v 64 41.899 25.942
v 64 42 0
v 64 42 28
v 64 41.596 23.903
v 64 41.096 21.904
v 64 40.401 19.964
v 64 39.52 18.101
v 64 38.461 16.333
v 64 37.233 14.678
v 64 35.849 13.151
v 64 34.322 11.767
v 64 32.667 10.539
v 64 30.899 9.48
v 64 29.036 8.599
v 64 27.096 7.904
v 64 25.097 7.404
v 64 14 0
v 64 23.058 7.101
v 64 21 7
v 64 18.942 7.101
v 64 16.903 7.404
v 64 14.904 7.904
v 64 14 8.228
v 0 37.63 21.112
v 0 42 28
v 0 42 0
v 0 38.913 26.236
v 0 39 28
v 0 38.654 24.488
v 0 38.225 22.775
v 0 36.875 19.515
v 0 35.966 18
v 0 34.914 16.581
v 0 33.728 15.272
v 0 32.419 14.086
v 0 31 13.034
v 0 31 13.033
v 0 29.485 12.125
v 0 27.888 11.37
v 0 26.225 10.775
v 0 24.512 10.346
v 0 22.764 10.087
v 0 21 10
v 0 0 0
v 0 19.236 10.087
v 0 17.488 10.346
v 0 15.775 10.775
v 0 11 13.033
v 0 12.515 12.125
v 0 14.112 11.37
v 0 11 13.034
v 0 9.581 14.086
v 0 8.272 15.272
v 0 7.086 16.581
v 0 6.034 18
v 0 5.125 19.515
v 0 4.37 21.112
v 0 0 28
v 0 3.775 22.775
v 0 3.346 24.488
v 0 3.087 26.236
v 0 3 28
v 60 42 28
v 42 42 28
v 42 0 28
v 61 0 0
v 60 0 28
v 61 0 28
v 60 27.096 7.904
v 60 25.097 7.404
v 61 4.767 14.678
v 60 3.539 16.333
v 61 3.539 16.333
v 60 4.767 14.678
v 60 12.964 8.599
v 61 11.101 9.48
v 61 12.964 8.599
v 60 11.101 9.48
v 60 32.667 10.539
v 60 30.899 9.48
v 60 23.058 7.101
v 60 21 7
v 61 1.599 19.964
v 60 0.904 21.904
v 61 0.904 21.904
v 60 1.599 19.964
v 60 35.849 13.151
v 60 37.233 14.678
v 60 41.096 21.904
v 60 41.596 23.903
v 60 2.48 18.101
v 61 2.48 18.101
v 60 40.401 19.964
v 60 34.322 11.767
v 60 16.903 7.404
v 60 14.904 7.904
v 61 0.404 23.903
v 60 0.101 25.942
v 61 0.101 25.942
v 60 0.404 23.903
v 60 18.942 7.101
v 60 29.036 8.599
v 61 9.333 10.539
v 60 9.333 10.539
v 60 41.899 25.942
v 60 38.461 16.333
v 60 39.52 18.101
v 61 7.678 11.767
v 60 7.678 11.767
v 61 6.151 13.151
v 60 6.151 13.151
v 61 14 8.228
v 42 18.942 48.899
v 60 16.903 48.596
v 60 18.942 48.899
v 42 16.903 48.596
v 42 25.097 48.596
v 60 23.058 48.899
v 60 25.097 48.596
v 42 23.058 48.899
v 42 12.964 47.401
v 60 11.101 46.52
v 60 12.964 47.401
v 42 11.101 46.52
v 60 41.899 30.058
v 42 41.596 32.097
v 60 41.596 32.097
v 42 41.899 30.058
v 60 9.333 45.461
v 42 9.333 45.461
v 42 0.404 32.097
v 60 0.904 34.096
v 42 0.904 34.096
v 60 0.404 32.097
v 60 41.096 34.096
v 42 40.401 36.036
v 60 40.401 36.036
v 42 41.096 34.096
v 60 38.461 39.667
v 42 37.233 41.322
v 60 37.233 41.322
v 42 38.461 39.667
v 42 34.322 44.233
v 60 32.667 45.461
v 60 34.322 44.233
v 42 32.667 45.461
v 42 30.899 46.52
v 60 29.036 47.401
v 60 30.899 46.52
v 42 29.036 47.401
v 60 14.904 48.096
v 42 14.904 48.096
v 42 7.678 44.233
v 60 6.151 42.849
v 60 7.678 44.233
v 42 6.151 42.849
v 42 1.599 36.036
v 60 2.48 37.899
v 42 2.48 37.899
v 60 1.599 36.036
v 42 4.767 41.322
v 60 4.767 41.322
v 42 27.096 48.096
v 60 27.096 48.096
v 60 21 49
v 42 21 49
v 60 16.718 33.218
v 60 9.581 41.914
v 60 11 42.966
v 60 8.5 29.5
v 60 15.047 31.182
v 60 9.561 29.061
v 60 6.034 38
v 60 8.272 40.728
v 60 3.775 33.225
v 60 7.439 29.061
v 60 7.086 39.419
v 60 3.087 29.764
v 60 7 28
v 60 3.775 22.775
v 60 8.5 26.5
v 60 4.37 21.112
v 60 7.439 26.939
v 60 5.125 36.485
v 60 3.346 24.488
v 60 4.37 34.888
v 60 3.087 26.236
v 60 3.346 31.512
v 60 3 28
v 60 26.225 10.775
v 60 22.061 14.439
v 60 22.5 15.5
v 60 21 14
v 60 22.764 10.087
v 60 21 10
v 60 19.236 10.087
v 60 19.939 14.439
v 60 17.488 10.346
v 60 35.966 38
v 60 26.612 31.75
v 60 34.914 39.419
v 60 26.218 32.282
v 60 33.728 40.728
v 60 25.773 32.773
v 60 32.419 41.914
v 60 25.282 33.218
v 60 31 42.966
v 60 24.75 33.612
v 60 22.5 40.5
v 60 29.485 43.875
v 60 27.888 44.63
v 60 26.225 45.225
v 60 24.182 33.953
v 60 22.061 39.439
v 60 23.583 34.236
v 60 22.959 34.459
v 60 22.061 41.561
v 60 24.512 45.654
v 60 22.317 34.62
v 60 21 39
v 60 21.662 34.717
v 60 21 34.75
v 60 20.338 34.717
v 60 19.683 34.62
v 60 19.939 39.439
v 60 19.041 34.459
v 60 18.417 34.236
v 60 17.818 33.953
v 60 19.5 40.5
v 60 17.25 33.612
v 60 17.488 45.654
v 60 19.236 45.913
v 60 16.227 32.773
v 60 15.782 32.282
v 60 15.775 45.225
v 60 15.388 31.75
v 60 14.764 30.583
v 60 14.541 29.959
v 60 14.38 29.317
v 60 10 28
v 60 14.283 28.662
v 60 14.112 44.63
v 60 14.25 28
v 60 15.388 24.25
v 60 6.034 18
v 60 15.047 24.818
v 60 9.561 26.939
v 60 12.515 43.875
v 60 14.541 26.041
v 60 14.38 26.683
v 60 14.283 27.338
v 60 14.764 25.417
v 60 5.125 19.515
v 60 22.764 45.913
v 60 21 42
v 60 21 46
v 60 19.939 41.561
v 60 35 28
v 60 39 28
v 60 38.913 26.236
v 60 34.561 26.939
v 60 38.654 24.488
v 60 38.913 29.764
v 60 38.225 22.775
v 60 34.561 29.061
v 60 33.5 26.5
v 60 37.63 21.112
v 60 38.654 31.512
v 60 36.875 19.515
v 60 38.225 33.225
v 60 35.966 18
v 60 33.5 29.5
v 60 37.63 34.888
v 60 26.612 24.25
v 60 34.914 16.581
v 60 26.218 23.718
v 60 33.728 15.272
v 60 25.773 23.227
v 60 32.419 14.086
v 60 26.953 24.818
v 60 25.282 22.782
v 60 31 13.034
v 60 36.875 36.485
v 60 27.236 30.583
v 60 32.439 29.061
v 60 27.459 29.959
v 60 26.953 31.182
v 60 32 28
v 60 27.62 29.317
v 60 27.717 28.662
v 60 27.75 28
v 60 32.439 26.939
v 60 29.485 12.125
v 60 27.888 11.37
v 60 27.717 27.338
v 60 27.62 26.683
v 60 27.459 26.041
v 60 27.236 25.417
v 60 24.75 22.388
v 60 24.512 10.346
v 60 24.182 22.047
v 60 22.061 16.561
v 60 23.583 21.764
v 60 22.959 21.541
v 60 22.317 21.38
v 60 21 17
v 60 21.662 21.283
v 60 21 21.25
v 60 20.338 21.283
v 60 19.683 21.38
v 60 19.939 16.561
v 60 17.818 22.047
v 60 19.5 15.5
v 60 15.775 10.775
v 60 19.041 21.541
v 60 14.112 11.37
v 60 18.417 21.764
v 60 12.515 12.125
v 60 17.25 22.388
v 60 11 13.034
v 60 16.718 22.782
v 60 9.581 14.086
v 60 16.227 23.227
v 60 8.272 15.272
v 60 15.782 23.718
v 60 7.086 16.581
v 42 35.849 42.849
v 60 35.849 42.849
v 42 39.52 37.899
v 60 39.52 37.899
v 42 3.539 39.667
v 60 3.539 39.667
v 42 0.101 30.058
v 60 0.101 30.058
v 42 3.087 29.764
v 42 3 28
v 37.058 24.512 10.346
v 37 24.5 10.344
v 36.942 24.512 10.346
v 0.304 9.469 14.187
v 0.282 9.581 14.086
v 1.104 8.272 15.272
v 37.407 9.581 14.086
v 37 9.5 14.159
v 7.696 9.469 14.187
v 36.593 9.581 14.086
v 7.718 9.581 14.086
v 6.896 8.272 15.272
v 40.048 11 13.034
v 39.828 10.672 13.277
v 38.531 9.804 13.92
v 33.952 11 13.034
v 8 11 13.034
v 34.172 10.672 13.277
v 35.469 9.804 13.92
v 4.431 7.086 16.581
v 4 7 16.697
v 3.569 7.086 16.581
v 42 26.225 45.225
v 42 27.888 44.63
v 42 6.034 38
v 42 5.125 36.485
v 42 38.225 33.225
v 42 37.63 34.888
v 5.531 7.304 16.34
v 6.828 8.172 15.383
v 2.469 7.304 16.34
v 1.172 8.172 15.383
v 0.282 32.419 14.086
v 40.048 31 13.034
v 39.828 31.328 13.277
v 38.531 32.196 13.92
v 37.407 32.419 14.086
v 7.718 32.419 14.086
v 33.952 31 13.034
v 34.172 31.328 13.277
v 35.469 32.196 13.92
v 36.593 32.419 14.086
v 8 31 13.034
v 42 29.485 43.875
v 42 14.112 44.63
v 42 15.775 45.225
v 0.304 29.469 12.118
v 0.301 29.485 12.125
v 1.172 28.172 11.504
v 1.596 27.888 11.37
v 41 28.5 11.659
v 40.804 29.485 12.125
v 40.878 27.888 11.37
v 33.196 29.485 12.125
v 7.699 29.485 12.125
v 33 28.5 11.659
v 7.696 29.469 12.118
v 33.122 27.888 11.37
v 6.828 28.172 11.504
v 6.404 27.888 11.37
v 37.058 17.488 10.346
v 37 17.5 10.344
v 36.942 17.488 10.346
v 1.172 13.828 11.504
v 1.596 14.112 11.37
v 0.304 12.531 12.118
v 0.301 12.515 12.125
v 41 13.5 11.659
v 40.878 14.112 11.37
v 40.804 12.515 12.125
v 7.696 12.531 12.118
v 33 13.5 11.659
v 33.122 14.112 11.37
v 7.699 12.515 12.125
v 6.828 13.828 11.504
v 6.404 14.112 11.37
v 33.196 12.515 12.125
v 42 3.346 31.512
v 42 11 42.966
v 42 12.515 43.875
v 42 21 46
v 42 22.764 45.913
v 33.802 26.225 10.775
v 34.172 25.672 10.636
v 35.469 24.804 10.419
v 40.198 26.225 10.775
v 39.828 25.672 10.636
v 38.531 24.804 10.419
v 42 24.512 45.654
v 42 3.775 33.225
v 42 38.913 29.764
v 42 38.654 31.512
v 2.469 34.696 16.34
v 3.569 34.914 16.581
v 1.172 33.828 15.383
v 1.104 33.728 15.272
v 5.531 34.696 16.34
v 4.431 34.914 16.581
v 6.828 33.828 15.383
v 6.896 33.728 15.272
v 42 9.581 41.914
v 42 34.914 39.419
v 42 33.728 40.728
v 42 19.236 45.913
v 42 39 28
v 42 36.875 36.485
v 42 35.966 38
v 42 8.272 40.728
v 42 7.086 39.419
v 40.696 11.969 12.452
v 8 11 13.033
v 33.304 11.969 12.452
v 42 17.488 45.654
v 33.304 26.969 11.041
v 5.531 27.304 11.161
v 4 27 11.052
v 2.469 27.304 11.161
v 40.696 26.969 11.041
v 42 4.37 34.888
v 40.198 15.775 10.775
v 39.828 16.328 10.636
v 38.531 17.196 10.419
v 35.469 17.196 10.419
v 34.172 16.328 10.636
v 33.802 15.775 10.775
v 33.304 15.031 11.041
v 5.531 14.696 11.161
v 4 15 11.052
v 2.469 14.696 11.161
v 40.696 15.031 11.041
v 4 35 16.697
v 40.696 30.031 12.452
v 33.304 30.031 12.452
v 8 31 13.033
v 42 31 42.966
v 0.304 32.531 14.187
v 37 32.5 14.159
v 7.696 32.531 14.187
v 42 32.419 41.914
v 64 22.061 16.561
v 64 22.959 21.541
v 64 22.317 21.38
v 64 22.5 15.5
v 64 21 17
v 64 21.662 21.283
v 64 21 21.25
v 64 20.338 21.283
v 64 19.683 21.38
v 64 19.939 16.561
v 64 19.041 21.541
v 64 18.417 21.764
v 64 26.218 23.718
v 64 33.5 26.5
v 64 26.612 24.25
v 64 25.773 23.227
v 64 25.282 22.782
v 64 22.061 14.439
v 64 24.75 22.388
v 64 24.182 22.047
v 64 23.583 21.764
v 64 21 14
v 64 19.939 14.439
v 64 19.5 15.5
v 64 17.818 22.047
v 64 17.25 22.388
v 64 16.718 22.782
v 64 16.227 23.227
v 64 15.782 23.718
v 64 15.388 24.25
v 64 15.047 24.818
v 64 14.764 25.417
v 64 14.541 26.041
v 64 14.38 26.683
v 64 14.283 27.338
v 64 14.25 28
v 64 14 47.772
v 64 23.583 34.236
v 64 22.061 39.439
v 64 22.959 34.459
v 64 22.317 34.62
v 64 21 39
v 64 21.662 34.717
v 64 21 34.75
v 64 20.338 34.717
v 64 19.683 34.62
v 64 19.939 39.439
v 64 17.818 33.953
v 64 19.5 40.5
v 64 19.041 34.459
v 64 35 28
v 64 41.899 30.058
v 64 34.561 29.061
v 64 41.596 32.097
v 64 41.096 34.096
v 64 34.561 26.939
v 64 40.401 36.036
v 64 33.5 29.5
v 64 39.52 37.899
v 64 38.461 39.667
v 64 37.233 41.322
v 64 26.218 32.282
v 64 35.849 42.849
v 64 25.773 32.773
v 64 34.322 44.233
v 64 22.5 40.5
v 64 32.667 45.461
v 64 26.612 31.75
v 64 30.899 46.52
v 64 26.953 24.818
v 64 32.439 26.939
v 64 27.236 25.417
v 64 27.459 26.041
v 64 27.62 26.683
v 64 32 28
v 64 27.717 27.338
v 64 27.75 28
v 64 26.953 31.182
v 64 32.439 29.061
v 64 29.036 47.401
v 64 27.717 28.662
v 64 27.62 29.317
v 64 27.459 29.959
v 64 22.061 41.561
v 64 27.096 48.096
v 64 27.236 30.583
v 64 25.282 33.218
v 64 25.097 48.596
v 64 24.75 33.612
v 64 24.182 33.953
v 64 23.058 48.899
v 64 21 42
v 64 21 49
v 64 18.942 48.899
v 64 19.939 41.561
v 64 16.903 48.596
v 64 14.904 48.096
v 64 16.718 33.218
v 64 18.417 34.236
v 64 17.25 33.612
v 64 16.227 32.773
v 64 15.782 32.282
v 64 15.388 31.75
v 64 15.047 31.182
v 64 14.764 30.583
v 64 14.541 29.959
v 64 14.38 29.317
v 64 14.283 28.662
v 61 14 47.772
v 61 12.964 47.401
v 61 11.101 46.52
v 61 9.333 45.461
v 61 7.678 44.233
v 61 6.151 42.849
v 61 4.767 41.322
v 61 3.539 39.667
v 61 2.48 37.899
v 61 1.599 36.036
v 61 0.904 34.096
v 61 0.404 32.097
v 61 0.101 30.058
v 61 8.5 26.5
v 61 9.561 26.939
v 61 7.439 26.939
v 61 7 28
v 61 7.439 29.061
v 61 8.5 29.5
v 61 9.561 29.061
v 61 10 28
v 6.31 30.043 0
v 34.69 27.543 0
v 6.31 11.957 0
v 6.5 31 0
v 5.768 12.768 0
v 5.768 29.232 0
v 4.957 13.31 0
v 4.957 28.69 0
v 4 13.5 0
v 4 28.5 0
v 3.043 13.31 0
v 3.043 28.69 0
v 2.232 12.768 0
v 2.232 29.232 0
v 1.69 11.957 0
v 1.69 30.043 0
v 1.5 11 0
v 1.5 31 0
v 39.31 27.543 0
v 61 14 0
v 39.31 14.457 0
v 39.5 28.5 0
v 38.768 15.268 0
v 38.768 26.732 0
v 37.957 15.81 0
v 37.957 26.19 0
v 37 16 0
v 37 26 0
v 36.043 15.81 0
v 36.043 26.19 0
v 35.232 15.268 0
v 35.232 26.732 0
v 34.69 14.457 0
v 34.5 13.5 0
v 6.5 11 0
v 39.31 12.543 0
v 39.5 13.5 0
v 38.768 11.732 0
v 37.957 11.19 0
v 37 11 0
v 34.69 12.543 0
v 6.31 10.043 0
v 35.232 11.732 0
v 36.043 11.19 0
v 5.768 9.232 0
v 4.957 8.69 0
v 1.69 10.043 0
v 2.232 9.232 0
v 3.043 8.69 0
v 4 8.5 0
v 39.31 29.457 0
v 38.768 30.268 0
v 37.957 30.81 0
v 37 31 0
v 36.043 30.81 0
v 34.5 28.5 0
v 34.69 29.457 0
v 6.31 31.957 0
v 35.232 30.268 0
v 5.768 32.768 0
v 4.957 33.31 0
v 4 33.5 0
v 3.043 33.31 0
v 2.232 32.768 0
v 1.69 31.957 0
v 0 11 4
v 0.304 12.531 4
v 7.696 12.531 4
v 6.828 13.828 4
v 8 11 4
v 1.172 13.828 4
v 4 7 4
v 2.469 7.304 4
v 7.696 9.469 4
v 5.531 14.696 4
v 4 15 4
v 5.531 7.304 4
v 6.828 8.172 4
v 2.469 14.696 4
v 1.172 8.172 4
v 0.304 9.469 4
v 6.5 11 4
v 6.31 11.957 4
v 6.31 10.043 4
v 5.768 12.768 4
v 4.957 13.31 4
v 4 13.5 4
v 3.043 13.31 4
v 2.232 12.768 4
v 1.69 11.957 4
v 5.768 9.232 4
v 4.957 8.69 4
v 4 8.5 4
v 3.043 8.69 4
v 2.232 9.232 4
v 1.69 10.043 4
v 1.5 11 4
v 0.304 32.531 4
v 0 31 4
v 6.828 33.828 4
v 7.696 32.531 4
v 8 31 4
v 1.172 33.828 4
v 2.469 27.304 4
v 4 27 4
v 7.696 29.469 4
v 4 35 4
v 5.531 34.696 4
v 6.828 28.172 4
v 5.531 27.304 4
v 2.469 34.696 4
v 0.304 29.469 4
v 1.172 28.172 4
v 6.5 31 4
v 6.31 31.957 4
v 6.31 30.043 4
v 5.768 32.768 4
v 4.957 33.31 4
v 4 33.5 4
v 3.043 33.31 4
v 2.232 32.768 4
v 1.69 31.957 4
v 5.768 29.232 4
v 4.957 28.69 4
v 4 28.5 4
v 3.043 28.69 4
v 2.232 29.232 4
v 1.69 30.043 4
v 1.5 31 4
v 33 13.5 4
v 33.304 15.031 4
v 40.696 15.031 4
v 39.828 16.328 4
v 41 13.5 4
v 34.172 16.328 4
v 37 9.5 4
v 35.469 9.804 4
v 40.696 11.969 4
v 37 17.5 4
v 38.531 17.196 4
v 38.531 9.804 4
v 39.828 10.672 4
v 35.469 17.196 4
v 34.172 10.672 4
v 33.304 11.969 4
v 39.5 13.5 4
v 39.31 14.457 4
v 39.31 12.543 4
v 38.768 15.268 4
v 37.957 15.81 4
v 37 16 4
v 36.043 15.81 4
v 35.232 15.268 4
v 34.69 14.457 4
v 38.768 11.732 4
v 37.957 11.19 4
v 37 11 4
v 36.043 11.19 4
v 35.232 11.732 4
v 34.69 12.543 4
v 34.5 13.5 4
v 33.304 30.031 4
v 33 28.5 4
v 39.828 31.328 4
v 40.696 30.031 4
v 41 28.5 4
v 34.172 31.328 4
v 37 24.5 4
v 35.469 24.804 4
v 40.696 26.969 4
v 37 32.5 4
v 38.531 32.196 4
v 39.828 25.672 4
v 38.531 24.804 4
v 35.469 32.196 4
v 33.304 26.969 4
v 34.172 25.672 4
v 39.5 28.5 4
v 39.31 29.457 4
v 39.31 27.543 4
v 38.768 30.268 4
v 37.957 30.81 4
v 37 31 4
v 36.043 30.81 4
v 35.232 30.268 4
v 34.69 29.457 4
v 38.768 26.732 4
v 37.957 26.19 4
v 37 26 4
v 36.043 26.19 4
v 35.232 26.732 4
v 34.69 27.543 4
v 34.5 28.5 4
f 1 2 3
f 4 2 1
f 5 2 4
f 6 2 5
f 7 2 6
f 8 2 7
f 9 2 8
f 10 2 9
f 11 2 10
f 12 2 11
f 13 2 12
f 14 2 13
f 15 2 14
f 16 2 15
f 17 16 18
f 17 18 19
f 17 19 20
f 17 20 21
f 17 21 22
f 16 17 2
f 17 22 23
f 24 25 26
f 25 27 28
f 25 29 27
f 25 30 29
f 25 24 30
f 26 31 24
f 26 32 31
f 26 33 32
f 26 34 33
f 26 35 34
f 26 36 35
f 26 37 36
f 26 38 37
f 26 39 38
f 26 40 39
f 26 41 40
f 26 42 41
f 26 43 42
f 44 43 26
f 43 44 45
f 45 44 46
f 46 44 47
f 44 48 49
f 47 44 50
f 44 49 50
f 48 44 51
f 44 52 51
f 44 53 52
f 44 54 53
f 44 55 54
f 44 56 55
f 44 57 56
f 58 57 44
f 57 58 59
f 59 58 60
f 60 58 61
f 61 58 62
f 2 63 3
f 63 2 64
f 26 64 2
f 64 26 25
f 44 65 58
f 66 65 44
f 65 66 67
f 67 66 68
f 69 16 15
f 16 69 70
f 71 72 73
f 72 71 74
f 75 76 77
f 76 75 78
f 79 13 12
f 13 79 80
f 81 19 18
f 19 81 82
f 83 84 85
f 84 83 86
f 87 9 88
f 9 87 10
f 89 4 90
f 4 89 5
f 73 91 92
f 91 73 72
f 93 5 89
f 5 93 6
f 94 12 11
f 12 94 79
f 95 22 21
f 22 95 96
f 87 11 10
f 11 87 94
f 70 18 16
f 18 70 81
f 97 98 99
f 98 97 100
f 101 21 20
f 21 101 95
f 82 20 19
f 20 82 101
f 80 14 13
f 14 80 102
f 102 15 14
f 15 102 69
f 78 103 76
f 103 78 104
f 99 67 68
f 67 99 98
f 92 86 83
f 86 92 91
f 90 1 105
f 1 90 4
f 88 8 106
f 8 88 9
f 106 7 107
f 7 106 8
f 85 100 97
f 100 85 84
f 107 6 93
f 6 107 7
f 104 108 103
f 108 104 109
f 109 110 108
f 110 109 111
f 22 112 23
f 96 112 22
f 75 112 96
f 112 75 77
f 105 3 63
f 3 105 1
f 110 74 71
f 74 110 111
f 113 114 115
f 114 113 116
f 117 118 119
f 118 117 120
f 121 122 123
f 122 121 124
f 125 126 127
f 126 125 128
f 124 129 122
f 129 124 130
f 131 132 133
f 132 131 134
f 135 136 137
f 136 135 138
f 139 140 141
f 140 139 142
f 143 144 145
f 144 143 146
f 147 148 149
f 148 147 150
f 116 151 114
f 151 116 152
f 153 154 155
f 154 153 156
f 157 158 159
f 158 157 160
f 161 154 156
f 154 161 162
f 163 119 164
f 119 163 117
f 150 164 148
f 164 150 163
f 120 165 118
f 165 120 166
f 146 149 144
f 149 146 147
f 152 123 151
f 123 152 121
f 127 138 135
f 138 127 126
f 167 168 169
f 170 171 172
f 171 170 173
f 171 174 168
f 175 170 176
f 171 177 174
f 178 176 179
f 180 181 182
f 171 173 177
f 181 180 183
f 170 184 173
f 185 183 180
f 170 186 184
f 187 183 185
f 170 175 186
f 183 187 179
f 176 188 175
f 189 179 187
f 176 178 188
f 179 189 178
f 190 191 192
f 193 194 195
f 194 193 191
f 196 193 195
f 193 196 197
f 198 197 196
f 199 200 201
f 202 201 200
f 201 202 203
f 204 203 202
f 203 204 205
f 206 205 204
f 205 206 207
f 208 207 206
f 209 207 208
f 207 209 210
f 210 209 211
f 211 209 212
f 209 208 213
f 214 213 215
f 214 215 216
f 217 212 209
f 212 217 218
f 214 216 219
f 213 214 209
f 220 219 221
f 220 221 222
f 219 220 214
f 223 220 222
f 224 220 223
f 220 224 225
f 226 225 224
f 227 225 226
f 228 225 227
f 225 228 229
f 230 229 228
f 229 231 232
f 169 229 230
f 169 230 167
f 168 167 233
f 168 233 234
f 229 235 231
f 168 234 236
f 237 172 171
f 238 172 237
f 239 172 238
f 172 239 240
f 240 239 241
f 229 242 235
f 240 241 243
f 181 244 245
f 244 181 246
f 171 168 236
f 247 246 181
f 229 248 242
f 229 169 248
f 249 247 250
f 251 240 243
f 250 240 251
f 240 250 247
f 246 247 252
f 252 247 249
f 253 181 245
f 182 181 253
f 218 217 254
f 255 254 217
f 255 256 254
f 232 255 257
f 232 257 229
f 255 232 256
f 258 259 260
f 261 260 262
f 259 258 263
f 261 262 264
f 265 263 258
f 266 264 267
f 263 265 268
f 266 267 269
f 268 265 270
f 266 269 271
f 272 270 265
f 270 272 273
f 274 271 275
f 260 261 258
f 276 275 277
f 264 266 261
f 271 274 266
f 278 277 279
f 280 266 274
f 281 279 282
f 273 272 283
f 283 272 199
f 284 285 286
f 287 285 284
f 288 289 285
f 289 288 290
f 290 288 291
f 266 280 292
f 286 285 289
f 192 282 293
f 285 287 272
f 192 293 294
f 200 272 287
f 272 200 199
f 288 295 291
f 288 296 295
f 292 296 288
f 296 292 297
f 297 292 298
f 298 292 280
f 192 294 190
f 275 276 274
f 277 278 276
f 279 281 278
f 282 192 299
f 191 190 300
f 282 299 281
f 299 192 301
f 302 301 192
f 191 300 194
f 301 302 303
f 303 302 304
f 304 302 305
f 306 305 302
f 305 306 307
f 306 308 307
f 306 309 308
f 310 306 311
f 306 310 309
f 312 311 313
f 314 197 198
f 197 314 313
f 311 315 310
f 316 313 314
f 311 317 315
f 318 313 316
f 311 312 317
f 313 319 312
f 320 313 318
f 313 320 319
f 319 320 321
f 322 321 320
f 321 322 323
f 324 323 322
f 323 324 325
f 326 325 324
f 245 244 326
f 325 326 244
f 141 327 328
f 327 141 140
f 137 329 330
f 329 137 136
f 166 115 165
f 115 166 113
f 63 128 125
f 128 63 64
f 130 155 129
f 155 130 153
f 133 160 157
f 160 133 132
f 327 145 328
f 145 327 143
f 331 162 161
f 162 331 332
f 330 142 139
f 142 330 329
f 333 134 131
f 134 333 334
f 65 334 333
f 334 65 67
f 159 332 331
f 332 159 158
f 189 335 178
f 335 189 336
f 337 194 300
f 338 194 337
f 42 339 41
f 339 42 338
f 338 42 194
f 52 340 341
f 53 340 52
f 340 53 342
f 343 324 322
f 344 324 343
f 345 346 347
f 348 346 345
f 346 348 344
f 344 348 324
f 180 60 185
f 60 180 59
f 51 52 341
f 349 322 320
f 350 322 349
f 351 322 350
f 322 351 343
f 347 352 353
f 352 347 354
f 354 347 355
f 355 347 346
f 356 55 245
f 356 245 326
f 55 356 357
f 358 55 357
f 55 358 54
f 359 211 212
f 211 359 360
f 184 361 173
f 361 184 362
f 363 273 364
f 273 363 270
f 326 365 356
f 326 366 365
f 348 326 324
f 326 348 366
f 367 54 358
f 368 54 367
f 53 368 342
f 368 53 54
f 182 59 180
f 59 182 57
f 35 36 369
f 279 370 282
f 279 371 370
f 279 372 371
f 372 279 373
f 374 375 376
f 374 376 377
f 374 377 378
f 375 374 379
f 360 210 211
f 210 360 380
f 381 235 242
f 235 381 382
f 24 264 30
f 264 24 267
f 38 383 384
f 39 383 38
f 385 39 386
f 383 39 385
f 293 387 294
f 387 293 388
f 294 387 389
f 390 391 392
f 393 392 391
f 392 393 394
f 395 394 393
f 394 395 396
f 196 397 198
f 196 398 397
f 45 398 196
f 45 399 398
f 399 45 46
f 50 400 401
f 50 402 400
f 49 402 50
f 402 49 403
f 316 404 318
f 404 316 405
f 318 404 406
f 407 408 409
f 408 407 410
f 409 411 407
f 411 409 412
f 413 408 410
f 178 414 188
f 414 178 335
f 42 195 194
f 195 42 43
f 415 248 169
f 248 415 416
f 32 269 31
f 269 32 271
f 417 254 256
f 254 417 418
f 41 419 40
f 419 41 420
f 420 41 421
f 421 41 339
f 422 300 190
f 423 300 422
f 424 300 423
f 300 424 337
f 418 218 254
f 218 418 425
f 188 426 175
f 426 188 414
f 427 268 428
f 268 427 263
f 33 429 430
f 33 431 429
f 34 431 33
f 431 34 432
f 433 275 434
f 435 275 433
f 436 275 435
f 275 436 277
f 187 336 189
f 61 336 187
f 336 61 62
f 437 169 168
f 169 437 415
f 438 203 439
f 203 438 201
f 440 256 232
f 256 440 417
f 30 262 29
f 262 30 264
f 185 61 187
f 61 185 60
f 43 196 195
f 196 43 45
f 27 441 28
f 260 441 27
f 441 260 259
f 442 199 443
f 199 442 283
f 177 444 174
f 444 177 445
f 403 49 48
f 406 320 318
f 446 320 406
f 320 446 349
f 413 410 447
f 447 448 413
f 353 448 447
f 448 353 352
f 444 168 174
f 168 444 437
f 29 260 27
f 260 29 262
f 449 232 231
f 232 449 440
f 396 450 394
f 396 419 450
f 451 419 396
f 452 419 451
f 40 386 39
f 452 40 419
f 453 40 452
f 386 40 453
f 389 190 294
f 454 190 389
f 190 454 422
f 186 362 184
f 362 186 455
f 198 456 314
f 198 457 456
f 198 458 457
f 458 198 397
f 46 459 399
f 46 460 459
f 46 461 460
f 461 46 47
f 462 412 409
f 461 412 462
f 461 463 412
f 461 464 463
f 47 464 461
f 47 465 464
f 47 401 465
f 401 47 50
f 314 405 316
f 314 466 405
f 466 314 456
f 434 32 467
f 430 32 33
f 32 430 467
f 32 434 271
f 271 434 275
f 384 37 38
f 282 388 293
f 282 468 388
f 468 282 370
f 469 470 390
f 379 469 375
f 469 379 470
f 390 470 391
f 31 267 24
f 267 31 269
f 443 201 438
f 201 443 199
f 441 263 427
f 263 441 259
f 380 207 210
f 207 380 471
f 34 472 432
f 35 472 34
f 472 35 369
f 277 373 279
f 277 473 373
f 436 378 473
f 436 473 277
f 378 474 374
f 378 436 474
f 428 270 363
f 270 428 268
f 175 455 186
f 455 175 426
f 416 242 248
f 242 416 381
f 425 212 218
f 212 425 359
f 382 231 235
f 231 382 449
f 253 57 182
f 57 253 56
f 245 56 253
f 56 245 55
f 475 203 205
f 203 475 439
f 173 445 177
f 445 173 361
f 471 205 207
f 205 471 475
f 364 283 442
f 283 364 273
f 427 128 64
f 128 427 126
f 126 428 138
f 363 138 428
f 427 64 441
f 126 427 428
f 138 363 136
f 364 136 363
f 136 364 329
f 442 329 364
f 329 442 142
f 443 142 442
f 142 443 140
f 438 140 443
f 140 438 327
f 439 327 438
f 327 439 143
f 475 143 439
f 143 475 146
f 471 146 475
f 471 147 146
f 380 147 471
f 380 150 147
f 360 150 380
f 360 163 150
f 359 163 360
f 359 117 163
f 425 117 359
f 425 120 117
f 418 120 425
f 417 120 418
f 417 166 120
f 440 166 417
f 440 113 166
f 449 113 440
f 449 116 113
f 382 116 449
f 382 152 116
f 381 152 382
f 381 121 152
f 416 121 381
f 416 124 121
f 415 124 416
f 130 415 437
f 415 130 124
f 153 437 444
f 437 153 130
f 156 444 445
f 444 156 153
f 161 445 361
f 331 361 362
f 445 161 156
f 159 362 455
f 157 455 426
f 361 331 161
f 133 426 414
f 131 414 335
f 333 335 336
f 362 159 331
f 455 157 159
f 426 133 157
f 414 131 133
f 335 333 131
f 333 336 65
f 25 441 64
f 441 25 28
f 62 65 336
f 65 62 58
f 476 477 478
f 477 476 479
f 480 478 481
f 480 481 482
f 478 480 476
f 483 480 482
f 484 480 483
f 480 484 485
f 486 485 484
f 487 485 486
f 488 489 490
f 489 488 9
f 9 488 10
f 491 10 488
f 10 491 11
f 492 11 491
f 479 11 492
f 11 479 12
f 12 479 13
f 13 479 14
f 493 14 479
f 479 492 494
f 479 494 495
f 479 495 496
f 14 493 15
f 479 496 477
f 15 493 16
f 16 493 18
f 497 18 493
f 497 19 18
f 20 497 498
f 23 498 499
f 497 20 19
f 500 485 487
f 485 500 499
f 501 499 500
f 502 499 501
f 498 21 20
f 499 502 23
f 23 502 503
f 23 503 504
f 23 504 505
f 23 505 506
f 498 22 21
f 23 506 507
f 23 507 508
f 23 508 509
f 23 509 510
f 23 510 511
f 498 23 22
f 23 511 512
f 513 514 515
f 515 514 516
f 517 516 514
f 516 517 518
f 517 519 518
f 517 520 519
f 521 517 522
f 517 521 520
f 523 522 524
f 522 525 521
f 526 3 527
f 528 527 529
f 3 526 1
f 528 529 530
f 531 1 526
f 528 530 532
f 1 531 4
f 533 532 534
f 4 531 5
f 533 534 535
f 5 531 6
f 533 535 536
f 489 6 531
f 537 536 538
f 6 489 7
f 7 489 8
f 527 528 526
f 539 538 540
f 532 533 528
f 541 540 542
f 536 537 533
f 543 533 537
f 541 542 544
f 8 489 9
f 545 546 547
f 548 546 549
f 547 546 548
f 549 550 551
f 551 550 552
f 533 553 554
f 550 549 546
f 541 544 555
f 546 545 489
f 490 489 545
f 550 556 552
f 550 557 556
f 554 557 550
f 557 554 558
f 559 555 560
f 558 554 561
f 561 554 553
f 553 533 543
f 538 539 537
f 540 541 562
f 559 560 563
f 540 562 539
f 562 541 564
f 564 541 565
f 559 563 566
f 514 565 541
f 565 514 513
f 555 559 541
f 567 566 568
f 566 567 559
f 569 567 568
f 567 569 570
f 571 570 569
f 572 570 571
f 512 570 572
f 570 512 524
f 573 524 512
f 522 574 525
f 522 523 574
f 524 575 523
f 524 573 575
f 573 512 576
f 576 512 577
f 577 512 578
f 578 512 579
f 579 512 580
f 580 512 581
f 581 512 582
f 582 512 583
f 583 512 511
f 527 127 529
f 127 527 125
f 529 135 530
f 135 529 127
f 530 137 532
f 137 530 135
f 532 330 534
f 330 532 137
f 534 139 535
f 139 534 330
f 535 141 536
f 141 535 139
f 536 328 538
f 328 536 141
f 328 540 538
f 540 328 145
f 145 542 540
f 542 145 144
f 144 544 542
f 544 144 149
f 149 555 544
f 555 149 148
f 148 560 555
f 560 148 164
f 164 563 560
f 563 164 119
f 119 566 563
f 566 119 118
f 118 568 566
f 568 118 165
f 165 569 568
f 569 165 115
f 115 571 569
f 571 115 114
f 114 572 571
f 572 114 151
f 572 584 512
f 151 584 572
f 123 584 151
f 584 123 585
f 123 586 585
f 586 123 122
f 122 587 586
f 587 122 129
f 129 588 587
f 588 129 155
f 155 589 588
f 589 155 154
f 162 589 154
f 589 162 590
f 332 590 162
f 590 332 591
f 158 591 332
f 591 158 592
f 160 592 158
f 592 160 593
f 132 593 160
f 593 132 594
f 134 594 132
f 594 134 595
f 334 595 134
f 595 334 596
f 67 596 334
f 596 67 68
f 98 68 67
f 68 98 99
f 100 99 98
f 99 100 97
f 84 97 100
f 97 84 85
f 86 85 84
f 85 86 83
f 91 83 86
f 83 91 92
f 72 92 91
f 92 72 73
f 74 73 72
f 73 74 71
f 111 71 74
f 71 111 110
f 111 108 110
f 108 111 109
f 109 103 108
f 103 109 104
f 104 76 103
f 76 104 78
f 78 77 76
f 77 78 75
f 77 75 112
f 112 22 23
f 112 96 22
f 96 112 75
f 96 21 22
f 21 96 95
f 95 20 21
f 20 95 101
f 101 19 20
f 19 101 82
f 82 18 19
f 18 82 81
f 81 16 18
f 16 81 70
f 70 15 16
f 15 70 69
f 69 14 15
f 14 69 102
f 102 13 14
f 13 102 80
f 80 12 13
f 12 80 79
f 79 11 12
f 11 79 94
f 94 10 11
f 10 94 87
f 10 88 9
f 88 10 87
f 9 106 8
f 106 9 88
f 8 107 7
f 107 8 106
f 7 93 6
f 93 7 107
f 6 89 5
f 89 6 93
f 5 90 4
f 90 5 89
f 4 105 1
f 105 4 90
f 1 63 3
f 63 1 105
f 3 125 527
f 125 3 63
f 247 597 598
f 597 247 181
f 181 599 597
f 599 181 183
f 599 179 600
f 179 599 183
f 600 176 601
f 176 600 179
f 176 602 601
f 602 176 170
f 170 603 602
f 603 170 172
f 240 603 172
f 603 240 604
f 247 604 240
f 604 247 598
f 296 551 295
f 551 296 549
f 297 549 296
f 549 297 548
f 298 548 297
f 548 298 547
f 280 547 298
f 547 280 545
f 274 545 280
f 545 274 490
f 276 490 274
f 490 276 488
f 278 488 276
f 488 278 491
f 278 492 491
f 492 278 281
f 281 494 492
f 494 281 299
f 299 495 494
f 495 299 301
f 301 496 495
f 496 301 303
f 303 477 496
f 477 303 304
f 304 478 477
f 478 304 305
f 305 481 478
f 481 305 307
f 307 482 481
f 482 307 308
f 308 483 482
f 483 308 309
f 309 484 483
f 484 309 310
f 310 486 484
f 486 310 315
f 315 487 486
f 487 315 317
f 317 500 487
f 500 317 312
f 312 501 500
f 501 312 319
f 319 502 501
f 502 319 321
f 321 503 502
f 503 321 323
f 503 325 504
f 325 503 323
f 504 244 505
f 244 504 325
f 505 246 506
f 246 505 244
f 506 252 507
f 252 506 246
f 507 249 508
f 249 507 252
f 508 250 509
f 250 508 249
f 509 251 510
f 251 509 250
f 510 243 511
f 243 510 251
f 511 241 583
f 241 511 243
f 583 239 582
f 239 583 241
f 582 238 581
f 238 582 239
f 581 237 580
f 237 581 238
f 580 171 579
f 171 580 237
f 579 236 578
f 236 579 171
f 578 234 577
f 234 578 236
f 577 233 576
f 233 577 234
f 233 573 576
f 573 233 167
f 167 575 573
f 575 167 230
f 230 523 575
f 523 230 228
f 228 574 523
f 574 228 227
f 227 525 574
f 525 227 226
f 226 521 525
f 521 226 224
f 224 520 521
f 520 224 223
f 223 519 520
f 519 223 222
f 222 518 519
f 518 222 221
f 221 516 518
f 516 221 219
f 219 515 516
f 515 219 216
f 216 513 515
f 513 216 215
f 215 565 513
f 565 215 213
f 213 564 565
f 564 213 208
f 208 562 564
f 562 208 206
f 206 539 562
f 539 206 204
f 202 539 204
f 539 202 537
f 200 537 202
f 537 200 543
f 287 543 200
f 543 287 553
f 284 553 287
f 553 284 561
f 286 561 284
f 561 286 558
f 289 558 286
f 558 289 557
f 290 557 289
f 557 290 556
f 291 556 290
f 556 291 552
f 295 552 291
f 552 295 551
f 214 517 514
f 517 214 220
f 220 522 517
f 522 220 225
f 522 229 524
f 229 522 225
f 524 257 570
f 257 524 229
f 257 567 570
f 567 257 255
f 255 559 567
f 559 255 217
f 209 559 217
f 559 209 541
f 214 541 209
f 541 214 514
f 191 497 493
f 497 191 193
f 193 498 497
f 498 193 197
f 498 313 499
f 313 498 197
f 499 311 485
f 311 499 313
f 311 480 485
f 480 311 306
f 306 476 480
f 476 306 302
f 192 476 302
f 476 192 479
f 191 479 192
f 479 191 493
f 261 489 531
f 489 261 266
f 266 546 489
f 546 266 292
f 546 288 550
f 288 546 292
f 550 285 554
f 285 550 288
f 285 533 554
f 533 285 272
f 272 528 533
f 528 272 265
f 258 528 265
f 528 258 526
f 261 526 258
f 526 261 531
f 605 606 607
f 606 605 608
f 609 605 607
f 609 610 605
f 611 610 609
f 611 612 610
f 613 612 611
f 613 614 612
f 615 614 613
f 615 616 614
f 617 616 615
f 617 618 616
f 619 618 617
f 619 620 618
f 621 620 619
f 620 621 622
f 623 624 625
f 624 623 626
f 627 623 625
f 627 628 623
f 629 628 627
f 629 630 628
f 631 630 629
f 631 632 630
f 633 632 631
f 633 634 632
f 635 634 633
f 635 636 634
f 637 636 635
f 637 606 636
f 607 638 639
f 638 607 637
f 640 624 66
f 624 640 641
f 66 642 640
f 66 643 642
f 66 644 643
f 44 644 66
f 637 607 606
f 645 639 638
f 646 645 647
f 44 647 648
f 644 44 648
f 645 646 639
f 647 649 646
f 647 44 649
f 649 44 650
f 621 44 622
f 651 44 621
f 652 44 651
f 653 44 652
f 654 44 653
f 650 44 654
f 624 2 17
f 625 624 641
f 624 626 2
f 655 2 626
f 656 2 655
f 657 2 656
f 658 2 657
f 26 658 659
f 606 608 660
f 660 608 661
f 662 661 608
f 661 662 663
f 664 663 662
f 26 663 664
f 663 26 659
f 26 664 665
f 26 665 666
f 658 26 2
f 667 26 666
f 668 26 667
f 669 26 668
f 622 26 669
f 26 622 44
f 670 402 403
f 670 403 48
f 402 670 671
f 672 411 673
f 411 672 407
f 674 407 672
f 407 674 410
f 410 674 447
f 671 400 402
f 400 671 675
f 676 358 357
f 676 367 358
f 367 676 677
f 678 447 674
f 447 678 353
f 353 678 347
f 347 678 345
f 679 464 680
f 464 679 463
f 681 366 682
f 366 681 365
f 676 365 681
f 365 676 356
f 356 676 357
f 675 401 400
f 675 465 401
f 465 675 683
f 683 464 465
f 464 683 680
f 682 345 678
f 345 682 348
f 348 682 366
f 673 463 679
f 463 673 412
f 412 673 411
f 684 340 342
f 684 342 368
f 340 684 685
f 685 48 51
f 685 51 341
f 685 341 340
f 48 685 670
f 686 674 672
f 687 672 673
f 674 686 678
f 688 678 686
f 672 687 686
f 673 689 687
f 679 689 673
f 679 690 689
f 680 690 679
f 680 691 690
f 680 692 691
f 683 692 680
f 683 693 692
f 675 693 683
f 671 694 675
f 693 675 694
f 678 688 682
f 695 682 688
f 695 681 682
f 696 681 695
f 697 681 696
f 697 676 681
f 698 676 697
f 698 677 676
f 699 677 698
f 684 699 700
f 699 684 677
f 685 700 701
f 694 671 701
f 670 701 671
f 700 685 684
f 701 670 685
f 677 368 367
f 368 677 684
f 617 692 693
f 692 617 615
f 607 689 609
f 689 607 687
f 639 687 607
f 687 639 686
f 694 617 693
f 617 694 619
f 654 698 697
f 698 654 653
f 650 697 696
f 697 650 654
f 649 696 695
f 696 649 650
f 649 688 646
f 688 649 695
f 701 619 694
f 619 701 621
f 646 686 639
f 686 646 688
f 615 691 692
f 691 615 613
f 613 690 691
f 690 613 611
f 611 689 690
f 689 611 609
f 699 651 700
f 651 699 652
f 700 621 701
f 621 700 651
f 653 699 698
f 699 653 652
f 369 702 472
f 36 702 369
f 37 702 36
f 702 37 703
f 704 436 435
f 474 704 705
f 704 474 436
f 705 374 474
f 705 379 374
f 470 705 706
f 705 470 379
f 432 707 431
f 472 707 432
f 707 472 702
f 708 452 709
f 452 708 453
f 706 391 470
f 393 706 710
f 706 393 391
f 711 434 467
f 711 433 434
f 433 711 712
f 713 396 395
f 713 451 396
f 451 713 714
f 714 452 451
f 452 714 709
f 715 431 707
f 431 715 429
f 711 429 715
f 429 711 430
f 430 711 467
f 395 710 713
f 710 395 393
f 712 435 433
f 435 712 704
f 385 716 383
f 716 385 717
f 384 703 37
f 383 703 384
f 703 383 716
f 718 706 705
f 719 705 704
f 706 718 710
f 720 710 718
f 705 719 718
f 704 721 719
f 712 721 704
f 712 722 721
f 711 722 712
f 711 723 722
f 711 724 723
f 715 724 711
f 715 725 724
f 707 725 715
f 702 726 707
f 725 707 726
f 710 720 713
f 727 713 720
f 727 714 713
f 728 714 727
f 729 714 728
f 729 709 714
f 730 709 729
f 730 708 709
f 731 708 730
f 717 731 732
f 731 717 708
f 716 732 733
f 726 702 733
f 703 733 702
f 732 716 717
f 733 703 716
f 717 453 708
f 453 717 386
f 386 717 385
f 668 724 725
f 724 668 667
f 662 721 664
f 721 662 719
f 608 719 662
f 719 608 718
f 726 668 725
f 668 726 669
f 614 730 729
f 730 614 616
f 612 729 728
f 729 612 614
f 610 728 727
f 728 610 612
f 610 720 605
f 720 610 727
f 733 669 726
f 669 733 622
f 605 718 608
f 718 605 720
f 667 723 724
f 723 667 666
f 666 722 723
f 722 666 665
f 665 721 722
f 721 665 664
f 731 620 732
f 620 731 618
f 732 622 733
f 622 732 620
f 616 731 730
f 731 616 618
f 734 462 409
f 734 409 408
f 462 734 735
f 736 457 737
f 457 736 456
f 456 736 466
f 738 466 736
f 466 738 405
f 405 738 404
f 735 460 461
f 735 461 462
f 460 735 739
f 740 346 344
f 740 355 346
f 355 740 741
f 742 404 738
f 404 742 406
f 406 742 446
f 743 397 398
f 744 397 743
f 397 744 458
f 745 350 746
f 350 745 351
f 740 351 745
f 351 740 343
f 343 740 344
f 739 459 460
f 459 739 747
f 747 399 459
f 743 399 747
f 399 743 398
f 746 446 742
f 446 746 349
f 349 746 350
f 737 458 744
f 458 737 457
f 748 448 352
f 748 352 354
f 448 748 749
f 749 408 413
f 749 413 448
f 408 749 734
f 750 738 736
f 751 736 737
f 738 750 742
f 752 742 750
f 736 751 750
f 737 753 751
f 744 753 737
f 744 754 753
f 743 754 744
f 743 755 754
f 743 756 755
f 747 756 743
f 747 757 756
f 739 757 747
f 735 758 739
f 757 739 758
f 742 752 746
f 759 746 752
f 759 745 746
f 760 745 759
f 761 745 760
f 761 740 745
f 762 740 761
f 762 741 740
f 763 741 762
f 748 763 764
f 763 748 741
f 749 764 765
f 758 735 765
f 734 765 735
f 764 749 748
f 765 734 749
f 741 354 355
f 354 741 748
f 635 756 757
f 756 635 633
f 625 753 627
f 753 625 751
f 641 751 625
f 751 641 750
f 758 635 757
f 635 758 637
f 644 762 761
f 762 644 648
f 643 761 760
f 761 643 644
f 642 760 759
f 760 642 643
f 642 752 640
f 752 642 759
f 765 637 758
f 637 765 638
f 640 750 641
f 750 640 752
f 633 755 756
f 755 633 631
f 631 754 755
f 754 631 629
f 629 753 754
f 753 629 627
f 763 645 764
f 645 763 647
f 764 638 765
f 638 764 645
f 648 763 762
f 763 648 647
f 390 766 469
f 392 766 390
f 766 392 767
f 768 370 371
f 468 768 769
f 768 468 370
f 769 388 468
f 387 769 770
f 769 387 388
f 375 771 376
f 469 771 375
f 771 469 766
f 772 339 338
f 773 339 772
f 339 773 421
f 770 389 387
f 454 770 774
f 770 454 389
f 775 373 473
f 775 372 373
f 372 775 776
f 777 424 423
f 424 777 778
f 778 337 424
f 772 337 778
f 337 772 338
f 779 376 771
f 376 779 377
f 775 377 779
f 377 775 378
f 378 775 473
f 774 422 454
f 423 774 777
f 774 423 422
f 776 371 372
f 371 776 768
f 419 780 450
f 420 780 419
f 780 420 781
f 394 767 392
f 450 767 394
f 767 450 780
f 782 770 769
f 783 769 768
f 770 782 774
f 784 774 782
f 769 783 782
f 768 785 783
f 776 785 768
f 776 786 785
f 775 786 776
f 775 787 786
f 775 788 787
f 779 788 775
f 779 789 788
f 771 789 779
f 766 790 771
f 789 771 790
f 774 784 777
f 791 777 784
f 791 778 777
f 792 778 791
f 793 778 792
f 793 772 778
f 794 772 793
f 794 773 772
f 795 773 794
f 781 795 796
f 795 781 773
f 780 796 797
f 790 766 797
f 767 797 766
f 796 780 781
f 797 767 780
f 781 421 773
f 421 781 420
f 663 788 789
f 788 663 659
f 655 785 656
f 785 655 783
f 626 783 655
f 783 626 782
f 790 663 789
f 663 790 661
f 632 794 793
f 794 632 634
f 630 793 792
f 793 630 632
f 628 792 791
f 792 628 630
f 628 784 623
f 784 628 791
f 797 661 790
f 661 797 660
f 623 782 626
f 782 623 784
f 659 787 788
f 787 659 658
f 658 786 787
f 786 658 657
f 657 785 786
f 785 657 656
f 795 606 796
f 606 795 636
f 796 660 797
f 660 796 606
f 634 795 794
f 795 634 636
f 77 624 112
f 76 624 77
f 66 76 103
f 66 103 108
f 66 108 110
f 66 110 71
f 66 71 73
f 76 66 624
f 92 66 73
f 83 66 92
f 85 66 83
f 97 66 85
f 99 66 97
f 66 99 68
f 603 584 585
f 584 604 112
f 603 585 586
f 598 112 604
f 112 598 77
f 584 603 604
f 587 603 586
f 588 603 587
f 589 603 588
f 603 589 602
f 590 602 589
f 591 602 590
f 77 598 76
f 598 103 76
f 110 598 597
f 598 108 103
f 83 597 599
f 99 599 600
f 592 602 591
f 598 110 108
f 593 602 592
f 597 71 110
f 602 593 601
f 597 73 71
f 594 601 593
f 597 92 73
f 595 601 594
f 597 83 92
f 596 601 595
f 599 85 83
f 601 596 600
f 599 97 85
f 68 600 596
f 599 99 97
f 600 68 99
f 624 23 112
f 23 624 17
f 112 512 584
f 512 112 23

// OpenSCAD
fn=64;
$fn=fn;


motor_d=36;
motor_l=60;


plate_screw_d   = 3;
plate_screw_off = 25/2;
plate_gear_hole_d = 13.5;
plate_gear_hole_l = 16;

bottom_screw_1_gap_y = 20;
bottom_screw_2_gap_y = 15;
bottom_screw_1_gap_x = 4;
bottom_screw_2_gap_x = 37;

plate_h=4;

bottom_t = 7;
front_t = 3;

motor_case_d = motor_d+front_t*2;

motor_plate_y=14;
motor_plate_x_off=1;

difference(){
  translate([0,0,bottom_t])
  union(){
    translate([motor_l,motor_case_d/2,motor_case_d/2])
    rotate([0,90,0])
    plate(plate_h=plate_h);



    difference(){
      motor_case();

      translate([0,front_t,front_t])
      motor();


      translate([0,0,motor_case_d/2]) 
      cube([motor_l-18, motor_case_d,motor_case_d/2]);
    }
    translate([0,0,-bottom_t]) 
  cube([motor_l+plate_h,motor_case_d,bottom_t]);
  }
  translate([motor_l+motor_plate_x_off,0,0]) 
  #cube([plate_h,motor_plate_y,motor_case_d+bottom_t]);
  #translate([0,front_t,4])
  bottom_screws();
}

module motor_case(){
  translate([0,motor_case_d/2,motor_case_d/2])
  rotate([0,90,0])
  cylinder(d=motor_case_d,h=motor_l);
  difference(){
    cube([motor_l+plate_h,motor_case_d,motor_case_d/2]);
    translate([0,motor_case_d/2,motor_case_d/2]) 
    rotate([0,90,0])
    cylinder(d=motor_case_d,h=motor_l+plate_h);
  }
}

module bottom_screws(){
  translate([bottom_screw_1_gap_x,(motor_d-bottom_screw_1_gap_y)/2,0])
  {
    screw();
    translate([0,bottom_screw_1_gap_y,0])
    screw();
  }

  translate([bottom_screw_2_gap_x,(motor_d-bottom_screw_2_gap_y)/2,0])
  {
    screw();
    translate([0,bottom_screw_2_gap_y,0])
    screw();
  }
}


module screw(d1=8,d2=5, l2=20, l1=50){
  cylinder(d=d1,h=l1,$fn=fn/4);
  translate([0,0,-l2])
  cylinder(d=d2,h=l2,$fn=fn/4);
}

module motor(){
  translate([0,motor_d/2,motor_d/2])
  rotate([0,90,0])
  union(){
    // translate([0,0,plate_gear_hole_l])
    cylinder(d=motor_d,h=motor_l);
    cylinder(d=plate_gear_hole_d,h=motor_l+plate_gear_hole_l);
  }
}

module plate(plate_h=1.5){


  // translate([-29,0,18.5])
  rotate([0,0,180])

  difference(){
    linear_extrude(height = plate_h) 
    difference(){
      circle(d=motor_case_d);
      circle(d=plate_gear_hole_d);

      // START SCREW HOLES
      translate([plate_screw_off,0,0])
      circle(d=plate_screw_d,$fn=fn/8);

      translate([-plate_screw_off,0,0])
      circle(d=plate_screw_d,$fn=fn/8);

      translate([0,plate_screw_off,0])
      circle(d=plate_screw_d,$fn=fn/8);

      translate([0,-plate_screw_off,0])
      circle(d=plate_screw_d,$fn=fn/8);
      // END SCREW HOLES
    }
  }
}
